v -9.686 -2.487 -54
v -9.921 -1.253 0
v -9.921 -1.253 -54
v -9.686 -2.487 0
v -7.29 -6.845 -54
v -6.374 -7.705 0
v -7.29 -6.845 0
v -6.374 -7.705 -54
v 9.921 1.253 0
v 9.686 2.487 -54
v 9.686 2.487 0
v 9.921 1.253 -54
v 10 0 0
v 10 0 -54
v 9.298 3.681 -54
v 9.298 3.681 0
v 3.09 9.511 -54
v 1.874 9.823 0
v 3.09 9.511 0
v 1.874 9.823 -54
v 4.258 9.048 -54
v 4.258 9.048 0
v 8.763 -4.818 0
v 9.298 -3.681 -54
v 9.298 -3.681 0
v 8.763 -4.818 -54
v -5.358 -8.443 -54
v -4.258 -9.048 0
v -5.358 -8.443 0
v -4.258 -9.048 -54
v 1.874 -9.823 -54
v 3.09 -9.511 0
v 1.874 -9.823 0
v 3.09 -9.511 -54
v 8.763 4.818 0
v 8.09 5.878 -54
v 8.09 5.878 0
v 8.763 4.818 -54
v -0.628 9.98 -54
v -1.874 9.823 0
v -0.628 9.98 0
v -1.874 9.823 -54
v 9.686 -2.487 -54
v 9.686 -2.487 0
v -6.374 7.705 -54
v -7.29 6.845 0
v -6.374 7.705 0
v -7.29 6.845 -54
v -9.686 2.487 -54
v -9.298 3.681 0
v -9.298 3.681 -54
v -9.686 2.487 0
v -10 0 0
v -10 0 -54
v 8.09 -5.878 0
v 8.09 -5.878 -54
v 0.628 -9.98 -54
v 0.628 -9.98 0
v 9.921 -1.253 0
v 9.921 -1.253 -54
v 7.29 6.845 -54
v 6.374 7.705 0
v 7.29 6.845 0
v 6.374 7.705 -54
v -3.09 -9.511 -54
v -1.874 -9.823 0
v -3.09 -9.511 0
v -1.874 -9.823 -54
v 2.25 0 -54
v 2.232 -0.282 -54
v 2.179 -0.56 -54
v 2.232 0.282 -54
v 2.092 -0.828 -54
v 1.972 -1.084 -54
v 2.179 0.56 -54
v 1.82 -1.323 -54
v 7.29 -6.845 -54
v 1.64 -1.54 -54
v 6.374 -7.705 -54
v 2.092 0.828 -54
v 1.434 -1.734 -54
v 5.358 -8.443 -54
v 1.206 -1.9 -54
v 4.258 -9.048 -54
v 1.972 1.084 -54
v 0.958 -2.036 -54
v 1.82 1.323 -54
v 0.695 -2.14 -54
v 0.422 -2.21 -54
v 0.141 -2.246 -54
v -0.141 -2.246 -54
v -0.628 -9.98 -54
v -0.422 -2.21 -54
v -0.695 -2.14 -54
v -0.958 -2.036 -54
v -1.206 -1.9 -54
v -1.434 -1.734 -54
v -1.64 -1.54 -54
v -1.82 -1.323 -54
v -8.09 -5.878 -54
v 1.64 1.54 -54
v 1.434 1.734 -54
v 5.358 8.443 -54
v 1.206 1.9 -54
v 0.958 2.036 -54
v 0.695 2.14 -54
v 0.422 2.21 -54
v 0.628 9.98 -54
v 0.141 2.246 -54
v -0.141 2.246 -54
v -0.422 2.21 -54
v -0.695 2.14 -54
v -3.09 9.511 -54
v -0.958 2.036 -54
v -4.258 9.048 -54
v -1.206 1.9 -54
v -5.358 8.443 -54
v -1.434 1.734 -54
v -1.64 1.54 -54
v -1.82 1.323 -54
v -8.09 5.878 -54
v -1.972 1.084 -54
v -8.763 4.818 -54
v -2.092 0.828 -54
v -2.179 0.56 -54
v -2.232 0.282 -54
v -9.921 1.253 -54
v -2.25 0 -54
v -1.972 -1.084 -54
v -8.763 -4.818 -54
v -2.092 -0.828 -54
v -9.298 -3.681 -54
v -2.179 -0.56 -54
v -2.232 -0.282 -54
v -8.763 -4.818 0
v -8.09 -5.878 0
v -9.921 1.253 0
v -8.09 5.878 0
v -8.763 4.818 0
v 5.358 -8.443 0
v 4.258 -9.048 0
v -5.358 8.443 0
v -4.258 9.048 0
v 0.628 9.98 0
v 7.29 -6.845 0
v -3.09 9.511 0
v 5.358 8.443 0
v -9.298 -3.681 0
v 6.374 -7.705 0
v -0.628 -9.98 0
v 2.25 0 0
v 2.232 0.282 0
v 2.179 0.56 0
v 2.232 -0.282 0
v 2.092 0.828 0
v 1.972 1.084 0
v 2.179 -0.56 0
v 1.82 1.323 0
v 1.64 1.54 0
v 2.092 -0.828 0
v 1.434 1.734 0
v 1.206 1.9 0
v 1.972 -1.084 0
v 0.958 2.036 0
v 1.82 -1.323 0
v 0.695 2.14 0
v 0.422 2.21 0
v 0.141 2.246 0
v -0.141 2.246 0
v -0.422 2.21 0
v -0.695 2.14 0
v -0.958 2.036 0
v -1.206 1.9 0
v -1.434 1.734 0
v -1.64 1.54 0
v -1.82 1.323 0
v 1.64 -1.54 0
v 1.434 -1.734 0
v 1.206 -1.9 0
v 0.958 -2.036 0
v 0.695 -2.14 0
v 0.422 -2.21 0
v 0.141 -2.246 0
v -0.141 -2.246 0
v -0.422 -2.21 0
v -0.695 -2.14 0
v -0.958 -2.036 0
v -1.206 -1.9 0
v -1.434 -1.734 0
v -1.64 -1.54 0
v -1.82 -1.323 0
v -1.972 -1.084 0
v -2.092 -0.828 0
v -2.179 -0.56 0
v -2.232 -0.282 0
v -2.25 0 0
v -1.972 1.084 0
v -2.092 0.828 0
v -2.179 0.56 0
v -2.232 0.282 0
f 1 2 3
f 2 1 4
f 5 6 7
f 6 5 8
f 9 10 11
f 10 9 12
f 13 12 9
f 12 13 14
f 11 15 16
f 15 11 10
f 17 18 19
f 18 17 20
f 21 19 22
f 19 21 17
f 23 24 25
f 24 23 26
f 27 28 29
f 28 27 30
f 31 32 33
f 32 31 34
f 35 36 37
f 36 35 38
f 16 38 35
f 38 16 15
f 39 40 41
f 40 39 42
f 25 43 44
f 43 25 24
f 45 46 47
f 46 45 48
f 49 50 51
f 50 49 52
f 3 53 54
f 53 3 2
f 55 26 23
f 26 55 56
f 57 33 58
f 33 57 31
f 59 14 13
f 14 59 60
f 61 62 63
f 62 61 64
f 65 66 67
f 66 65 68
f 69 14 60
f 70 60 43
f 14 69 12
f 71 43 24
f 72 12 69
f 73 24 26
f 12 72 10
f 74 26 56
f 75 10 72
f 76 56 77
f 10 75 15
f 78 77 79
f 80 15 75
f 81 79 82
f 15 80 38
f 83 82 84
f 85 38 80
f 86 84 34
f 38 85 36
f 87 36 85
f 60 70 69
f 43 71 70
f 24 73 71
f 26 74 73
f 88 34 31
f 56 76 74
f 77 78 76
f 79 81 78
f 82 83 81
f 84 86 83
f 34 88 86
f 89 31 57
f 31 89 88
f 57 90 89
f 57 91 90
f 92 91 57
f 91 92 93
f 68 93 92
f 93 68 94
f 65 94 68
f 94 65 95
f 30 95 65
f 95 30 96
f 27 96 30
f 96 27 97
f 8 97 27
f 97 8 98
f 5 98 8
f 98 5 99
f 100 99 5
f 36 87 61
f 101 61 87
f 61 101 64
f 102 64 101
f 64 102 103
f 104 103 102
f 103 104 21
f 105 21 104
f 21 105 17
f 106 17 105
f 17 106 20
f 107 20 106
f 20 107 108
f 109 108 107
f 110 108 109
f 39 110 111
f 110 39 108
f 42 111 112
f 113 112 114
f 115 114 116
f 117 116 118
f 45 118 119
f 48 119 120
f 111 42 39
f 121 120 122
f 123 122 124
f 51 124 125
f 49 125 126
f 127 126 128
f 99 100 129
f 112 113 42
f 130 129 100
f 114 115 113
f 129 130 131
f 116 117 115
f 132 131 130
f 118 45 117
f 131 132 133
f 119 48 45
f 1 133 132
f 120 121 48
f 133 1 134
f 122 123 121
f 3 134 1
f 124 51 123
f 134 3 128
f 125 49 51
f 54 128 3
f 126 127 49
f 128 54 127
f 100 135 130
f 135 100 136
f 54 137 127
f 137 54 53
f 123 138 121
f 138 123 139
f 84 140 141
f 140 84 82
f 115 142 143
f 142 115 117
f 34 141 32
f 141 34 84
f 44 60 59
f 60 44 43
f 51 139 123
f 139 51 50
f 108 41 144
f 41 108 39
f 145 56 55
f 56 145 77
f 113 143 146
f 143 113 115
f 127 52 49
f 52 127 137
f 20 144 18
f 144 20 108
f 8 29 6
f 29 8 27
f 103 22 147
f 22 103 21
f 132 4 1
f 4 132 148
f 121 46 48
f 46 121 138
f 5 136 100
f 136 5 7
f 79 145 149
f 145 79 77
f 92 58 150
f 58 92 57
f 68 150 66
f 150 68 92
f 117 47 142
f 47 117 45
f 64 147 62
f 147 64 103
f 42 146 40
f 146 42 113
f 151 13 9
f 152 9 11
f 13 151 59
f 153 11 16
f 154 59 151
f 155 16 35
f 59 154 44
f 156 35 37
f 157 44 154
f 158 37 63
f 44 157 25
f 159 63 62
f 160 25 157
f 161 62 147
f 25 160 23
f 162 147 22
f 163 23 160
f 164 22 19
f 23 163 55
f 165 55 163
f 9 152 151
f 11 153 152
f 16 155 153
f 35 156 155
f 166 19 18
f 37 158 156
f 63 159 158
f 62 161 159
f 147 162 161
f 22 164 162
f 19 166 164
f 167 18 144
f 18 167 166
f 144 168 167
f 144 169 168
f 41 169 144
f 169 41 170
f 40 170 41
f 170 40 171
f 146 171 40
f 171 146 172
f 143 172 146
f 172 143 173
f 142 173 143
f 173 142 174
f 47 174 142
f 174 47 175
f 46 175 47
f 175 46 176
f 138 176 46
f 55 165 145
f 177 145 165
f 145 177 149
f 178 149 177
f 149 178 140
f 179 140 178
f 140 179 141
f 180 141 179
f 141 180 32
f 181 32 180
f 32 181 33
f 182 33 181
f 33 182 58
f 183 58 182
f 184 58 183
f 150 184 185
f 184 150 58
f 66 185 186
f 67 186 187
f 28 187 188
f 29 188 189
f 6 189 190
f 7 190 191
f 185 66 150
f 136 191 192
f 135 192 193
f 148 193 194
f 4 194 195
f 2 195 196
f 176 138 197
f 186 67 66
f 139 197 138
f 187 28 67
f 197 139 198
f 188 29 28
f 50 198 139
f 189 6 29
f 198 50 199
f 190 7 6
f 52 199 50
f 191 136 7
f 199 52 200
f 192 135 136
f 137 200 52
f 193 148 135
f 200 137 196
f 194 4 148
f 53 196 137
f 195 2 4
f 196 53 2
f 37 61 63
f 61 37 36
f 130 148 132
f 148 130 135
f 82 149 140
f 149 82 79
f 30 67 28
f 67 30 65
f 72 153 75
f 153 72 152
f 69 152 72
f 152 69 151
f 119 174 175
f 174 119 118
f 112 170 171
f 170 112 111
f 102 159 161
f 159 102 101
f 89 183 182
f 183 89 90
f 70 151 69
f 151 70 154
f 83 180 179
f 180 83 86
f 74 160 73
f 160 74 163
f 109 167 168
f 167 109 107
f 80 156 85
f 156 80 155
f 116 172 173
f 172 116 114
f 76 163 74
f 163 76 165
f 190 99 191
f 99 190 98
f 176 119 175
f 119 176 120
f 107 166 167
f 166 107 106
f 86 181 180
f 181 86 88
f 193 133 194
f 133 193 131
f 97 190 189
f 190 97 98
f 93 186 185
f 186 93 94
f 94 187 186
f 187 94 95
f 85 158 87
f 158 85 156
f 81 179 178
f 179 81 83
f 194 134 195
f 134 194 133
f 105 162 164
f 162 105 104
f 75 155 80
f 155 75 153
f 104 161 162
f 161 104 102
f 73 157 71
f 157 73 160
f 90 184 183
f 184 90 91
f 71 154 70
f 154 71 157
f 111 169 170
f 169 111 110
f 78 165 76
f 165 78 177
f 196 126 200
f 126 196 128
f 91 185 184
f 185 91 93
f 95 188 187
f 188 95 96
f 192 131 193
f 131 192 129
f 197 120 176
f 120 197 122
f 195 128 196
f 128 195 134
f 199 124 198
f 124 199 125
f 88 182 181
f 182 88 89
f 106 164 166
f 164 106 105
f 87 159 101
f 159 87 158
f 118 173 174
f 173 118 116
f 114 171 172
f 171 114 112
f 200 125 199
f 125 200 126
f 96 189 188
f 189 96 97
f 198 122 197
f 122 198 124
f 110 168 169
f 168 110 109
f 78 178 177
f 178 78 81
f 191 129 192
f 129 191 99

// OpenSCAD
$fn = 50;


difference() {
	union() {
		translate(v = [0, 0, -54.0000000000]) {
			cylinder(h = 54, r = 10.0000000000);
		}
		cylinder(h = 0, r = 19.0000000000);
	}
	union() {
		#translate(v = [0, 0, -54]) {
			cylinder(h = 54, r = 2.2500000000);
		}
	}
}
